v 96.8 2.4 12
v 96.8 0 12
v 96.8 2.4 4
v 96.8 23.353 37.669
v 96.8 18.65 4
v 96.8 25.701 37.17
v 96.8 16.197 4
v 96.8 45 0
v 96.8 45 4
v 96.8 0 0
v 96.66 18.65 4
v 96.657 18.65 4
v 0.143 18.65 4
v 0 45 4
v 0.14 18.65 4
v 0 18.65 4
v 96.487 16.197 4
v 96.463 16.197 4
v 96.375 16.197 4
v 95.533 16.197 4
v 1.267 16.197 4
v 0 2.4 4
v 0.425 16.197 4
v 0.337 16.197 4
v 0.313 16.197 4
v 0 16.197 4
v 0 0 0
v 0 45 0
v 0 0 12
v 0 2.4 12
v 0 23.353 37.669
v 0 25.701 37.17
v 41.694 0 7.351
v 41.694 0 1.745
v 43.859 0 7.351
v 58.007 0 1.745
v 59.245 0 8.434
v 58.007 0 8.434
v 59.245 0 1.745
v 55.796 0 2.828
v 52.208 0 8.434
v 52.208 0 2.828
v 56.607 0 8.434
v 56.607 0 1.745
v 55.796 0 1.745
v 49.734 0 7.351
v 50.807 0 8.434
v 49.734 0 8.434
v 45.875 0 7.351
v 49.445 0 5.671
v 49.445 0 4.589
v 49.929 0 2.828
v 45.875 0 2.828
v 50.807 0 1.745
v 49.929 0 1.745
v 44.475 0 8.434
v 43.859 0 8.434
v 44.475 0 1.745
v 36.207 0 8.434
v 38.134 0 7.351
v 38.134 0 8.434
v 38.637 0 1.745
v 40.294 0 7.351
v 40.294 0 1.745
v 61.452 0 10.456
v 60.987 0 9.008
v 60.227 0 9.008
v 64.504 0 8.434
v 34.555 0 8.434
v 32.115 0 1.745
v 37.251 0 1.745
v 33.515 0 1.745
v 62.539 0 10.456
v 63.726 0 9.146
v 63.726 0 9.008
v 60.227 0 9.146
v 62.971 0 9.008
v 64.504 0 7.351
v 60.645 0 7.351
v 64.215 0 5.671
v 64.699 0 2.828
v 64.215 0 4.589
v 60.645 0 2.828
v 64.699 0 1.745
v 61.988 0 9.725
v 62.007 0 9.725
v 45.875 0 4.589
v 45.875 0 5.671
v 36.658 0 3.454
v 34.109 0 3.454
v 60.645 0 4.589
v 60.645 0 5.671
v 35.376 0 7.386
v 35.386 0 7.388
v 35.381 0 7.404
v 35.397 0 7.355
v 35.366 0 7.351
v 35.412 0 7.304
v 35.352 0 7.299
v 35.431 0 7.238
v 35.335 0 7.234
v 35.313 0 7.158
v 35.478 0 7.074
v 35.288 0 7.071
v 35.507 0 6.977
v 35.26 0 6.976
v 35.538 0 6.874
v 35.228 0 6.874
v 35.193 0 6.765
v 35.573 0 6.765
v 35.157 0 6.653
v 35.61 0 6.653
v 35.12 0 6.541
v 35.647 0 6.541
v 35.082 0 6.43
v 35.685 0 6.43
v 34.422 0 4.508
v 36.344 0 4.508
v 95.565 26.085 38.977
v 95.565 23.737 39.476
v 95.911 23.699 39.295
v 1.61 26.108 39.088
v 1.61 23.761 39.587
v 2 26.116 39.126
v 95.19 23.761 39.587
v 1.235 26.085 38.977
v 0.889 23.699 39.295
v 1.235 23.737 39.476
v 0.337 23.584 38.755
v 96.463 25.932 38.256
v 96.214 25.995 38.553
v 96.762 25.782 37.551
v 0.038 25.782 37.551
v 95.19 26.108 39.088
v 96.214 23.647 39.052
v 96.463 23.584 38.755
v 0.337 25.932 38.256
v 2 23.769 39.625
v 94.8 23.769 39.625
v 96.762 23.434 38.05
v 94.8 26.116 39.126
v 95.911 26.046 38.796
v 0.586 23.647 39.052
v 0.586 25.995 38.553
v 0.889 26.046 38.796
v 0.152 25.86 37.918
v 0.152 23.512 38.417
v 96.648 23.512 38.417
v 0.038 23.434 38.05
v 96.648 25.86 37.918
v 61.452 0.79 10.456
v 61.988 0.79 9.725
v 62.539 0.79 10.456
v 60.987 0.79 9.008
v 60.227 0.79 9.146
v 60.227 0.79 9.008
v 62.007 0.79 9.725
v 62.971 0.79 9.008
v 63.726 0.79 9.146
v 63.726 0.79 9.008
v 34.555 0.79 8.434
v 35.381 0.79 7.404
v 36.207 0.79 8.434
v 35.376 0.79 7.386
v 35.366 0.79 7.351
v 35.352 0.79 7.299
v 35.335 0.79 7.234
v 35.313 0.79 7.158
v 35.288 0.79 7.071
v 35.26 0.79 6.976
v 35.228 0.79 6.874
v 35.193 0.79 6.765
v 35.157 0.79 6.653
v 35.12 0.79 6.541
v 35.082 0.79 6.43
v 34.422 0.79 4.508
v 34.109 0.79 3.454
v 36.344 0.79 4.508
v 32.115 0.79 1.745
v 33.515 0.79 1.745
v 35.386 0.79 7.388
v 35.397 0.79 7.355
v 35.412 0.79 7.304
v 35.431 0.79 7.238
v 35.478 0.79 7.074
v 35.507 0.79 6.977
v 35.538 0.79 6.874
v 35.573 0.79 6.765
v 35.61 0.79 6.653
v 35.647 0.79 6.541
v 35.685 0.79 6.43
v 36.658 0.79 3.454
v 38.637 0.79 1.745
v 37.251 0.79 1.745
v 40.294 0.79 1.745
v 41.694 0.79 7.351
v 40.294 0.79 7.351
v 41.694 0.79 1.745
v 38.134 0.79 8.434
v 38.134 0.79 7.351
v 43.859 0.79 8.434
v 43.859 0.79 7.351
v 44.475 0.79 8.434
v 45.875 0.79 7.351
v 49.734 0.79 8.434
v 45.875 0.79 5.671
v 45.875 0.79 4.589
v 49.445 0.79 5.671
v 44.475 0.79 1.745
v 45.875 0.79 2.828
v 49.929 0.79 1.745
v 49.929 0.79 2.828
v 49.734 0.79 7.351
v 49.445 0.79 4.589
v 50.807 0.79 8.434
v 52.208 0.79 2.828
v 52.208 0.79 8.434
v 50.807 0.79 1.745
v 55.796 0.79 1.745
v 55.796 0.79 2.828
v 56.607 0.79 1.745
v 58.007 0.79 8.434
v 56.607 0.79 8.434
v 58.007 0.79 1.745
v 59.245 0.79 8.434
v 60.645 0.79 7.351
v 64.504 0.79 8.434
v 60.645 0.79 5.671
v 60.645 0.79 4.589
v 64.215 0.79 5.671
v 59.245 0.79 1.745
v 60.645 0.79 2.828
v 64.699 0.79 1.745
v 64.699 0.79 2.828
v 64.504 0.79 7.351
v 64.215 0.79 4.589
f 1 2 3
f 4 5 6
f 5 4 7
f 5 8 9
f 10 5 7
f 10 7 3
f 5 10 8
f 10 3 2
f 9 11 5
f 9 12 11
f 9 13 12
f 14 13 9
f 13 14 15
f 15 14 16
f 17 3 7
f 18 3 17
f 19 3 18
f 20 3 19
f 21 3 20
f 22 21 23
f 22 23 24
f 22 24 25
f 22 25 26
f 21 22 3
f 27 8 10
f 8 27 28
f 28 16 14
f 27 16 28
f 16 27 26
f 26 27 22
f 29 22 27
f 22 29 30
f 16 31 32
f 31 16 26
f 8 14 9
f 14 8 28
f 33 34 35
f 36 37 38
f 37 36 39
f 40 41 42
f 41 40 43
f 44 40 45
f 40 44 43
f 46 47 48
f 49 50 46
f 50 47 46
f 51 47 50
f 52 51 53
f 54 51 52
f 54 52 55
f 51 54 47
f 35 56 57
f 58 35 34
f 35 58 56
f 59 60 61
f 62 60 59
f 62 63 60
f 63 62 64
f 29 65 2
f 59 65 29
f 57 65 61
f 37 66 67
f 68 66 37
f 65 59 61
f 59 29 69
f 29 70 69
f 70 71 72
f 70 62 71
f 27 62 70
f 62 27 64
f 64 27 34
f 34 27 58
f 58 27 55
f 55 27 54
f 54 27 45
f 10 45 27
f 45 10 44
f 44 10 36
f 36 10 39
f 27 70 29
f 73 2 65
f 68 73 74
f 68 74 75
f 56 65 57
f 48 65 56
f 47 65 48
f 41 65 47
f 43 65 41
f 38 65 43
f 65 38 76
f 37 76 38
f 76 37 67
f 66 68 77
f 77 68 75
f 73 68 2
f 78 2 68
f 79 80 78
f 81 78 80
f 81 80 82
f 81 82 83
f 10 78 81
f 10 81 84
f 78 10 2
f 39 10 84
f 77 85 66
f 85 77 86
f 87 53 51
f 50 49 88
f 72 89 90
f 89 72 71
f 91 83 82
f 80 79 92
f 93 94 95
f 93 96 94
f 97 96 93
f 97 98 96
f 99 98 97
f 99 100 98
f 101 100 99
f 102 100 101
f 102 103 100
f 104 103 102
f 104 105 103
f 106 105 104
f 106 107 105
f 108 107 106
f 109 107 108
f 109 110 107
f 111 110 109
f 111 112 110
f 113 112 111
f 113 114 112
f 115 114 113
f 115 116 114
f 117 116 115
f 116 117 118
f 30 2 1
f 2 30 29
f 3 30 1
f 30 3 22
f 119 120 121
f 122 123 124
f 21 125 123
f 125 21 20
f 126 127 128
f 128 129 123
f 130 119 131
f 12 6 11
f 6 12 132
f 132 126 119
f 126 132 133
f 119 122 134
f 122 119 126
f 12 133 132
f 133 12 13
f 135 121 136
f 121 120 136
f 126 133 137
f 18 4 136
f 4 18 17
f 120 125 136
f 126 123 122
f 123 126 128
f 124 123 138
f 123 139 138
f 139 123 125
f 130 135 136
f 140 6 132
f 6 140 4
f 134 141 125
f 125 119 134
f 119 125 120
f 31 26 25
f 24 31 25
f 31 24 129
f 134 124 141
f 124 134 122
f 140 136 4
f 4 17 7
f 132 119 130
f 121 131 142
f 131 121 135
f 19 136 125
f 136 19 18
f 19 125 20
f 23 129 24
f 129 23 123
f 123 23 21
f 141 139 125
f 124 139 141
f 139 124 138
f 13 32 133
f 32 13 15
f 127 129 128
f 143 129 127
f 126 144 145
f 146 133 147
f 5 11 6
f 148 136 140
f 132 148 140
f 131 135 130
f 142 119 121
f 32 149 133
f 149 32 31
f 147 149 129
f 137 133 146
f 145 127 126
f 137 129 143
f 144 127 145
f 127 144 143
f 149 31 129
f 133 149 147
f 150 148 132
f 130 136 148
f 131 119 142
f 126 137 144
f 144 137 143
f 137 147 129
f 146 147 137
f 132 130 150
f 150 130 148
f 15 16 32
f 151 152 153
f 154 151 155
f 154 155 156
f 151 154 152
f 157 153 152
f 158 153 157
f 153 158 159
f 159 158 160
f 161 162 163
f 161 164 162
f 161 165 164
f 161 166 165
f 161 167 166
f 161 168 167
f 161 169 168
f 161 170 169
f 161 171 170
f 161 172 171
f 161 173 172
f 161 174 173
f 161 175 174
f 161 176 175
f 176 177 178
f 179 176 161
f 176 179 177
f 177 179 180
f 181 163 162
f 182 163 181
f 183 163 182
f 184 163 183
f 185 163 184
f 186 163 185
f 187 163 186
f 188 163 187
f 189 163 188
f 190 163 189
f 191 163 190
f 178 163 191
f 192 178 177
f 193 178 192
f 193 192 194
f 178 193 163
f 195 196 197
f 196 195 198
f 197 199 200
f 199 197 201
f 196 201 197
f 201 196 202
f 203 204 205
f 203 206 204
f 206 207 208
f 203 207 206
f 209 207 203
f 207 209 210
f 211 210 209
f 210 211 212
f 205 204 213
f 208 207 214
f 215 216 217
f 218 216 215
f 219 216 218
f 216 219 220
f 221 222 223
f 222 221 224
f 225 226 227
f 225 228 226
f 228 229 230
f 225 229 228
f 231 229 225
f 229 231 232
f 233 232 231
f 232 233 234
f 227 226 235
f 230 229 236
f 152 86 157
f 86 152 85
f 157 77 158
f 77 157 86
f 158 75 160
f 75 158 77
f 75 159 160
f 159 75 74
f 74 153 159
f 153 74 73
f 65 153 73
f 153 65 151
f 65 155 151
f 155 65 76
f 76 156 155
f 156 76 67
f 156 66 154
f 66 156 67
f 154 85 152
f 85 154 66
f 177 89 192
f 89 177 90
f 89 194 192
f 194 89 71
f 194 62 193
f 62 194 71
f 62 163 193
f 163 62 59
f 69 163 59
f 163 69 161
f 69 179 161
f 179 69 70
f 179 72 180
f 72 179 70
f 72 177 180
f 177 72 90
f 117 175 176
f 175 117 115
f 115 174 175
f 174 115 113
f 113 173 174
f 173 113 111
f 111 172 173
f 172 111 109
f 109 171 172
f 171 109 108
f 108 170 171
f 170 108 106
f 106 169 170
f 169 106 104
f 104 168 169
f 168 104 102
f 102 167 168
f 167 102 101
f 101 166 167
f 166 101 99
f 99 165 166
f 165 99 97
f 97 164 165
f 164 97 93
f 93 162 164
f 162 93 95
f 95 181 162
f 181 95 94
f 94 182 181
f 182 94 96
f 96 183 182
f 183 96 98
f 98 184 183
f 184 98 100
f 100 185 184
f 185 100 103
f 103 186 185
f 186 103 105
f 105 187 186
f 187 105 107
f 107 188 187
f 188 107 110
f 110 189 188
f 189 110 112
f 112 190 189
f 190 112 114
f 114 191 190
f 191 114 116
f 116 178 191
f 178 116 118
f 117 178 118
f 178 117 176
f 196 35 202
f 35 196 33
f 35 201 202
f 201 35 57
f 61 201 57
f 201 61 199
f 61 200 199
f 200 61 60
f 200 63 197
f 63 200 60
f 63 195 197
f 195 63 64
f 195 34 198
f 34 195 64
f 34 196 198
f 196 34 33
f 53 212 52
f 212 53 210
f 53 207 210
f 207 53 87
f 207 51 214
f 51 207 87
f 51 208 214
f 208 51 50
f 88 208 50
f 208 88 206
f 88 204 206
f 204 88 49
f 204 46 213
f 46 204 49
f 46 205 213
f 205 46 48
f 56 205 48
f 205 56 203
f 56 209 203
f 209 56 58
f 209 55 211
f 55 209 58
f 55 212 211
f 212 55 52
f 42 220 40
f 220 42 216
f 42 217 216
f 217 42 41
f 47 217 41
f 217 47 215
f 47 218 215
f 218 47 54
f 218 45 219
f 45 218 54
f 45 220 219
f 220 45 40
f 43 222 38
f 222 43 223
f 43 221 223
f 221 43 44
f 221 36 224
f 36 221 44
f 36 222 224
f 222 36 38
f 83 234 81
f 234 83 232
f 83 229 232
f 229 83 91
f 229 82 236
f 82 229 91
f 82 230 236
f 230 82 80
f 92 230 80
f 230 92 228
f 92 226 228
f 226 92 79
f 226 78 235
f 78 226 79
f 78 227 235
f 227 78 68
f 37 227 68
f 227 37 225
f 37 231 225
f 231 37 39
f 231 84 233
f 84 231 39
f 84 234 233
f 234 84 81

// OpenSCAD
// Porta-cartão de mesa - impressão 3D
card_w = 90;         // largura do cartão (mm)
card_h = 50;         // altura do cartão (mm)
stack = 12;          // espessura da pilha de cartões (mm)
wall = 2.4;          // espessura das paredes (mm)
clearance = 1;       // folga para os cartões (mm)
tilt = 12;           // inclinação do encosto (graus)
base_d = 45;         // profundidade da base (mm)
base_h = 4;          // altura da base (mm)
lip_h = 12;          // altura da aba da frente (mm)
back_h = 40;         // altura do encosto (mm)
word = "ATELIÊ";     // texto gravado
font_size = 7;       // altura da letra (mm)
engrave = 0.8;       // profundidade da gravação (mm)

body_w = card_w + 2 * clearance + 2 * wall;
pocket = stack + clearance;

corner_r = 2;        // raio dos cantos do encosto (mm)
corner_fn = 32;      // segmentos dos cantos arredondados

module rounded_plate(size, r) {
    hull()
        for (x = [r, size[0] - r], z = [r, size[2] - r])
            translate([x, 0, z])
                rotate([-90, 0, 0])
                    cylinder(r = r, h = size[1], $fn = corner_fn);
}

difference() {
    union() {
        cube([body_w, base_d, base_h]);
        cube([body_w, wall, lip_h]);
        translate([0, wall + pocket + wall, 0])
            rotate([-tilt, 0, 0])
                translate([0, -wall, 0])
                    rounded_plate([body_w, wall, back_h], corner_r);
    }
    translate([body_w / 2, -0.01, lip_h / 2])
        rotate([90, 0, 0])
            translate([0, 0, -engrave])
                linear_extrude(engrave + 0.01)
                    text(word, size = font_size, font = "Liberation Sans:style=Bold",
                         halign = "center", valign = "center");
}

echo(str("Largura: ", body_w, " mm"));
echo(str("Profundidade: ", base_d, " mm"));
echo(str("Altura: ", back_h * cos(tilt), " mm"));
